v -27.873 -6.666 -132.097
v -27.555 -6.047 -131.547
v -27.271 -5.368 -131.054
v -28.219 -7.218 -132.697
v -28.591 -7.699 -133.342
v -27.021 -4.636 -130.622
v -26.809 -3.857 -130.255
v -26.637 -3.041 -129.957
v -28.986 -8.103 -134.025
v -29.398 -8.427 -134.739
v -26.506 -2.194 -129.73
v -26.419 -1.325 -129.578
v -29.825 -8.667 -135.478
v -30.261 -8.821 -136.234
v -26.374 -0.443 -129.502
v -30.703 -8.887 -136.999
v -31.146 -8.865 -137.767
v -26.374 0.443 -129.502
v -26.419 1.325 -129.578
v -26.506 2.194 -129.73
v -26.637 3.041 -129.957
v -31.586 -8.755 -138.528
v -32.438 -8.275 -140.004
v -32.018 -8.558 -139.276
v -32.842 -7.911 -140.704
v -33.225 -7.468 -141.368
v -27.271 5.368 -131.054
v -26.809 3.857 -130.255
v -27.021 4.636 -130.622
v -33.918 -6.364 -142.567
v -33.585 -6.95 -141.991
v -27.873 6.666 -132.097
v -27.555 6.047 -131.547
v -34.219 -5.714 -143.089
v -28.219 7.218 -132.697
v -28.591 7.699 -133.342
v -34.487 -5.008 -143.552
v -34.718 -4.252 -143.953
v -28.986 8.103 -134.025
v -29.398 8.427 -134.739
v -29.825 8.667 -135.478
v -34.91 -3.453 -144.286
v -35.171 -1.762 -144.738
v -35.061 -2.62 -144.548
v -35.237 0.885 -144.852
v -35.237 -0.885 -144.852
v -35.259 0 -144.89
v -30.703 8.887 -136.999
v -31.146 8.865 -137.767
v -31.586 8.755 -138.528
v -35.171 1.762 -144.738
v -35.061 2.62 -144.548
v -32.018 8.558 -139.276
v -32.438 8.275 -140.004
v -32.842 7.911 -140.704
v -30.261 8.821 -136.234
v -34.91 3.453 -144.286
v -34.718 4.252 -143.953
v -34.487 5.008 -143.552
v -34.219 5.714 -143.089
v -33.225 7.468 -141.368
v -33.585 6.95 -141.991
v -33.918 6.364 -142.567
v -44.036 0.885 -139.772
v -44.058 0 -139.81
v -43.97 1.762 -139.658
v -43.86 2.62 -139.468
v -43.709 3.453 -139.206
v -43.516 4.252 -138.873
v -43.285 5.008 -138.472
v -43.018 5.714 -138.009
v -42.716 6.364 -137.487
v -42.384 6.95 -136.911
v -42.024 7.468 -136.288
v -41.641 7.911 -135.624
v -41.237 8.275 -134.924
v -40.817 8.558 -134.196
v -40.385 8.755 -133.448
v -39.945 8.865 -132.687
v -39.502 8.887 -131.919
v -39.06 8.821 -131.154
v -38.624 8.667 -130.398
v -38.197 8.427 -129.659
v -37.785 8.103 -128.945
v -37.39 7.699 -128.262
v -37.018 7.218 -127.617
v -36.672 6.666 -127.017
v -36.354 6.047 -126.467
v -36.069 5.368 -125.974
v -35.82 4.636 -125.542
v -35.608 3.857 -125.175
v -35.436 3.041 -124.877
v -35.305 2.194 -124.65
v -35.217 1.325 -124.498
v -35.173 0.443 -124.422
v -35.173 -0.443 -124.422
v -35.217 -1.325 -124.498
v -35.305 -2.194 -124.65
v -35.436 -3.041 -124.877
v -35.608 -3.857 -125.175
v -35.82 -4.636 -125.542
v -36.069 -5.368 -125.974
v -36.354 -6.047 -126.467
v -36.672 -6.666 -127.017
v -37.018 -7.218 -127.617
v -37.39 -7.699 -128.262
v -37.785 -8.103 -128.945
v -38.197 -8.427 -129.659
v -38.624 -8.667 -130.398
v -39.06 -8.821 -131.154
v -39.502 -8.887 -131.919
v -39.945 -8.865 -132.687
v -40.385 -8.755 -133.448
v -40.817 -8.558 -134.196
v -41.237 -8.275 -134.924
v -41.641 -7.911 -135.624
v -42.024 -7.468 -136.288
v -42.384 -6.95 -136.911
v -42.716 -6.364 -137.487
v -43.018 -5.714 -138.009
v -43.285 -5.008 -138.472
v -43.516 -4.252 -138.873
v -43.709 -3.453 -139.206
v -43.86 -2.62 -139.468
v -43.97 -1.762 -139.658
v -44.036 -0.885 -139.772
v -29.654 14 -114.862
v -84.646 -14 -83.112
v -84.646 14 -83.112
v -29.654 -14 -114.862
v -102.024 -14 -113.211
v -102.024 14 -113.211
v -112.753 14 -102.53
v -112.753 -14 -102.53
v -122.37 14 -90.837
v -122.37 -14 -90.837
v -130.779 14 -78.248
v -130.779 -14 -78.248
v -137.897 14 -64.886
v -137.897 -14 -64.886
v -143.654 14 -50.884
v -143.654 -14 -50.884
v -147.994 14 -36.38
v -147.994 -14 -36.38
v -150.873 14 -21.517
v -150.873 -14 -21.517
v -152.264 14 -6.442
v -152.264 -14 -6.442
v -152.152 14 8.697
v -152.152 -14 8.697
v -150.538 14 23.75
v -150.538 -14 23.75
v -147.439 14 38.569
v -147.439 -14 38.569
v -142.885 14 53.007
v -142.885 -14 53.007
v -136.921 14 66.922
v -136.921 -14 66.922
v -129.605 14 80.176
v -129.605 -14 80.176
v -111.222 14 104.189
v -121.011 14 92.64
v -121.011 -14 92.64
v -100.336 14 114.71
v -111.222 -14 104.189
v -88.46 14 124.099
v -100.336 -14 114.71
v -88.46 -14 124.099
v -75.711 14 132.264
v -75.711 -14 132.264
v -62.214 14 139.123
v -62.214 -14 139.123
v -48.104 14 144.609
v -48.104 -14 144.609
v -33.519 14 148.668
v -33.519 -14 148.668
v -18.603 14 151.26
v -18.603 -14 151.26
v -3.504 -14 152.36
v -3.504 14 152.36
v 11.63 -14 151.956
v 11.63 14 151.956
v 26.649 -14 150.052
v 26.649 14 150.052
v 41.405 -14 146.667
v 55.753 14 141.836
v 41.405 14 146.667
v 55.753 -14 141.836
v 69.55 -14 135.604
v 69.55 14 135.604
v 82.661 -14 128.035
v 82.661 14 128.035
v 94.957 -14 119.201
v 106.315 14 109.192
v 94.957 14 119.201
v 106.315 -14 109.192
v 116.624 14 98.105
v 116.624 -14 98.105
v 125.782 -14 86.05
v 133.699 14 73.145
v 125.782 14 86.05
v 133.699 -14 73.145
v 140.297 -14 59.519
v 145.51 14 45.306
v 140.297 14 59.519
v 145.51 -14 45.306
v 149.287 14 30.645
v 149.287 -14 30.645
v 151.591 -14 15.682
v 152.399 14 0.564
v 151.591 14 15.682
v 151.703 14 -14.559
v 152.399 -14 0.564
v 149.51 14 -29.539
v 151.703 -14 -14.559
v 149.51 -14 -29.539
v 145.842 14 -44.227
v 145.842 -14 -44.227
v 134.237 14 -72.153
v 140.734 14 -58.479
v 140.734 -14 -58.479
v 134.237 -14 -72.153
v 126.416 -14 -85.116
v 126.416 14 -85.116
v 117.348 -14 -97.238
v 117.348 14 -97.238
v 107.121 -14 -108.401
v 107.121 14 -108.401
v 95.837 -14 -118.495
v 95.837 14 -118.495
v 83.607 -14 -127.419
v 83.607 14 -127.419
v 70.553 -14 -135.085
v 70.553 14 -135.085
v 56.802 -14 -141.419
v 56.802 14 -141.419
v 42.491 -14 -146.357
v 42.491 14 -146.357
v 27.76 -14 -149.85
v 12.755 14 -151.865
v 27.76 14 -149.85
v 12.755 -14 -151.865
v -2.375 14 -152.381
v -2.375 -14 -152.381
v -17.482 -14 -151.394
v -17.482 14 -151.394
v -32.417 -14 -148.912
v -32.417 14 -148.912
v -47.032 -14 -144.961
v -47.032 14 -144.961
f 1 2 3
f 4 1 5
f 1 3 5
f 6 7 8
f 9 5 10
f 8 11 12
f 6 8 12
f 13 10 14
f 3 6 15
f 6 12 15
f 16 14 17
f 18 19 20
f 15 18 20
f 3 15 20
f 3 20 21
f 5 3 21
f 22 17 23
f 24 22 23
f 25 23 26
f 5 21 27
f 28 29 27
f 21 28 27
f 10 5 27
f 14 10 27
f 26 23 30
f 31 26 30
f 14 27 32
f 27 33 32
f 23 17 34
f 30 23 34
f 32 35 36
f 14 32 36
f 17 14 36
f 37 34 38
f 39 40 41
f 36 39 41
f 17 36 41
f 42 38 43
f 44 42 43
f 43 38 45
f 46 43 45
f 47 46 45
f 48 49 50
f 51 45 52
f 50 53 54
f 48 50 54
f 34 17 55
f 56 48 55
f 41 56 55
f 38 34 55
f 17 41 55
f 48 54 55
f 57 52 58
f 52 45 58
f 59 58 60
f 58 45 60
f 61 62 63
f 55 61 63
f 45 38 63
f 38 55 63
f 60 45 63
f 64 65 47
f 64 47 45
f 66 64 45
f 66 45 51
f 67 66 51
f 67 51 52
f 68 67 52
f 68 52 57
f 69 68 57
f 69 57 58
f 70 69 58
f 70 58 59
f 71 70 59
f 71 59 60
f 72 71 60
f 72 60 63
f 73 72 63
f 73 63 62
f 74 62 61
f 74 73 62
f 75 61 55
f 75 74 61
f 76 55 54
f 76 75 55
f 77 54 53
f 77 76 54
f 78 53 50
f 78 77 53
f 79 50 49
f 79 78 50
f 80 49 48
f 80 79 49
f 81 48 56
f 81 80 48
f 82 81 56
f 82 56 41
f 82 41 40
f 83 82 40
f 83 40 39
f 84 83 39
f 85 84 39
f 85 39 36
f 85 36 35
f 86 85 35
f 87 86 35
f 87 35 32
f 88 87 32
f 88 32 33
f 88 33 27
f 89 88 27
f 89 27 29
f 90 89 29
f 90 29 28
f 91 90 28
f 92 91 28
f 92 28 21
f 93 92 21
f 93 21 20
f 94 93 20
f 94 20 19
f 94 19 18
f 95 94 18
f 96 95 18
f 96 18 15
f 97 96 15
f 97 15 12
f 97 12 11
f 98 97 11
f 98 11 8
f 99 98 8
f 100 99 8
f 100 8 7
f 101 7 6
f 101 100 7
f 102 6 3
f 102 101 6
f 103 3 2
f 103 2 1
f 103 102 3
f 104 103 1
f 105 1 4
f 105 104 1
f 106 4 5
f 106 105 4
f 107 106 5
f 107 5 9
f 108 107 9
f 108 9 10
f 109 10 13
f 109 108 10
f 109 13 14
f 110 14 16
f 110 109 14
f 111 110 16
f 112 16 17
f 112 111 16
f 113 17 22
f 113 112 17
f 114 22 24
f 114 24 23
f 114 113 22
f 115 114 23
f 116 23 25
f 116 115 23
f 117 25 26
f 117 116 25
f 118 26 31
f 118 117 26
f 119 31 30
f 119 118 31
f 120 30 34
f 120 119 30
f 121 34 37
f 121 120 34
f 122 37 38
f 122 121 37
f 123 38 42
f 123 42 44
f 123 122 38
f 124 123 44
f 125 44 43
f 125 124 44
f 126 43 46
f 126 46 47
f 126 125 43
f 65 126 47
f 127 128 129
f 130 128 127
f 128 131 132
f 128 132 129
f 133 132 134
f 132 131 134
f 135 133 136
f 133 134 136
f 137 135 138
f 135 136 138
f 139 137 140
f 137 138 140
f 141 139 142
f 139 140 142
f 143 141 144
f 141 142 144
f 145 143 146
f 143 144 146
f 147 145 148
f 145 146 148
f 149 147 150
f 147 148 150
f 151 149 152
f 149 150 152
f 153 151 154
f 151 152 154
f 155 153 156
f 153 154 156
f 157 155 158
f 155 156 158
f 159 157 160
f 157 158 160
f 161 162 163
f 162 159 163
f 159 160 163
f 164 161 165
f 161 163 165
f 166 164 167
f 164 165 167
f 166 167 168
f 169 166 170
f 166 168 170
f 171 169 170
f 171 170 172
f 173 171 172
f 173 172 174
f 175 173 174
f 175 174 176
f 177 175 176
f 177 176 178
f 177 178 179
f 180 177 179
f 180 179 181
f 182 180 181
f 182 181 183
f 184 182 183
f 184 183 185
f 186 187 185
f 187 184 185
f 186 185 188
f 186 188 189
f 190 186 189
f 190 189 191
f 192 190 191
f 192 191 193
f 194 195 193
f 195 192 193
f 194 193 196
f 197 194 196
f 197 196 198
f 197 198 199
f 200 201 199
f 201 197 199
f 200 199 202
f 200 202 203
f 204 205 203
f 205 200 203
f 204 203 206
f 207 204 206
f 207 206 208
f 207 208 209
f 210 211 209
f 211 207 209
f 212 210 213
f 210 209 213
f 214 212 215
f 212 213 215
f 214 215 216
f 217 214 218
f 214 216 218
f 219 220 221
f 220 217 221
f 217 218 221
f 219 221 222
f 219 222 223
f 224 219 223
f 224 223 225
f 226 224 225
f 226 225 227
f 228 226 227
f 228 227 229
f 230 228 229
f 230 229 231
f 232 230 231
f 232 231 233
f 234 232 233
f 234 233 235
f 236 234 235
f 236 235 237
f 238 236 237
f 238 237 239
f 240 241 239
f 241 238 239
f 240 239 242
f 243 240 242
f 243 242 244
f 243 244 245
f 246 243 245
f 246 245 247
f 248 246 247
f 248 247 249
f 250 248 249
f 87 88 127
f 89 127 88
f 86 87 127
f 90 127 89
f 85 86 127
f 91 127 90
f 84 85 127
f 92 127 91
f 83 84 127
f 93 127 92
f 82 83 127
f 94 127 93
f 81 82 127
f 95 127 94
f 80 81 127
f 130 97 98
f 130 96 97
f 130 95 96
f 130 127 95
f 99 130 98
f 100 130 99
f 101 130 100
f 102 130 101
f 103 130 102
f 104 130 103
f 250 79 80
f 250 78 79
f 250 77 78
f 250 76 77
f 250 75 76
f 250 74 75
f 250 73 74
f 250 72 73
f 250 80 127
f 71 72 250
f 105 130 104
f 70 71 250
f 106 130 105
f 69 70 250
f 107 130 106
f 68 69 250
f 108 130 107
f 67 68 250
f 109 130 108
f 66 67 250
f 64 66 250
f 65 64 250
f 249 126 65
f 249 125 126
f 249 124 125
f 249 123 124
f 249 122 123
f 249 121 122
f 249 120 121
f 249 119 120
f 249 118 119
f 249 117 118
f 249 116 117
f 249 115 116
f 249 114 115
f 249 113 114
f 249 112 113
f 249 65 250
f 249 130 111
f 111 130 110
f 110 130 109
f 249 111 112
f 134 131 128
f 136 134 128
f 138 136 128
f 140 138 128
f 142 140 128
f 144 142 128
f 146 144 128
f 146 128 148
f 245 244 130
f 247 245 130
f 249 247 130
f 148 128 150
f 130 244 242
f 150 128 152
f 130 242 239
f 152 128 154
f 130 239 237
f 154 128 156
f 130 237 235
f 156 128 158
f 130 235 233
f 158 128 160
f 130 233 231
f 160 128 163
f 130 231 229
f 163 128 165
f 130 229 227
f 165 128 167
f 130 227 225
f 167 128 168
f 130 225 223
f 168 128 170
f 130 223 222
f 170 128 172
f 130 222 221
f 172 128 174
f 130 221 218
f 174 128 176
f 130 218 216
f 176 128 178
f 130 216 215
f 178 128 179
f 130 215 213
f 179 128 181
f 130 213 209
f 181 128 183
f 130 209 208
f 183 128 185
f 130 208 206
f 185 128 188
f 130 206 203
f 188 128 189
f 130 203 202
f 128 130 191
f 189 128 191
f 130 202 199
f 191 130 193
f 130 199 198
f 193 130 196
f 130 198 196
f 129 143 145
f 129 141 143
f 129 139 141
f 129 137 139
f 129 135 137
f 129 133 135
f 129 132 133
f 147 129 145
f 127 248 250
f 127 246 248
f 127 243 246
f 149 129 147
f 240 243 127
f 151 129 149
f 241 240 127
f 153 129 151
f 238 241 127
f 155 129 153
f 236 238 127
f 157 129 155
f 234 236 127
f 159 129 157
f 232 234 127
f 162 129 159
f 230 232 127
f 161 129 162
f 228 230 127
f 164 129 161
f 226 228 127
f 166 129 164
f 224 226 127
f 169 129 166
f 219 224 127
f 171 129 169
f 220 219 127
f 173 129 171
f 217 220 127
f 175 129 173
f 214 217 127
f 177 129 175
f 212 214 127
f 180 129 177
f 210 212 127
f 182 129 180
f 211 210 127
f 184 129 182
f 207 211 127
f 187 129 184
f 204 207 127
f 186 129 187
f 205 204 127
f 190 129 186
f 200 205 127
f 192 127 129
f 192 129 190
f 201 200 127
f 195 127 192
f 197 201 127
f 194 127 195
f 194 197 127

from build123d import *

# Parameters (mm, degrees)
BOSS_EXTRUDE1_DEPTH      = 13.9999974
BOSS_EXTRUDE1_DEPTH_BACK = 13.9999974
SKETCH4_R                = 152.4
CUT_EXTRUDE2_DEPTH       = 218.337340806
CUT_EXTRUDE2_DEPTH_BACK  = 218.337340806
SKETCH9_R                = 8.89
CUT_EXTRUDE4_DEPTH       = 41.91


with BuildPart() as part:
    # Sketch4 → Boss-Extrude1 (new, two sides: drawn at the far end of the back side and taken through both)
    with BuildSketch(Plane(origin=(0, 0, 0), x_dir=(1, 0, 0), z_dir=(0, 1, 0)).offset(-BOSS_EXTRUDE1_DEPTH_BACK)):
        with Locations(Location((0, 0, 0), (0, 0, 270))):
            Circle(SKETCH4_R)
    extrude(amount=BOSS_EXTRUDE1_DEPTH + BOSS_EXTRUDE1_DEPTH_BACK)

    # Sketch7 → Cut-Extrude2 (cut, two sides: drawn at the far end of the back side and taken through both)
    with BuildSketch(Plane(origin=(0, 13.9999974, 0), x_dir=(1, 0, 0), z_dir=(0, 1, 0)).offset(-CUT_EXTRUDE2_DEPTH_BACK)):
        Polygon((-48.70369343, 147.857271537), (-103.69630657, 116.107271537), (-84.64630657, 83.111703653), (-29.65369343, 114.861703653), align=None)
    extrude(amount=CUT_EXTRUDE2_DEPTH + CUT_EXTRUDE2_DEPTH_BACK, mode=Mode.SUBTRACT)

    # Sketch9 → Cut-Extrude4 (cut)
    with BuildSketch(Plane(origin=(0, 0, 0), x_dir=(-0.500000000000002, 0, -0.8660254037844375), z_dir=(0.8660254037844375, 0, -0.500000000000002))):
        with Locations((134.218010674, 0)):
            Circle(SKETCH9_R)
    extrude(amount=CUT_EXTRUDE4_DEPTH, mode=Mode.SUBTRACT)


solid = part.part
